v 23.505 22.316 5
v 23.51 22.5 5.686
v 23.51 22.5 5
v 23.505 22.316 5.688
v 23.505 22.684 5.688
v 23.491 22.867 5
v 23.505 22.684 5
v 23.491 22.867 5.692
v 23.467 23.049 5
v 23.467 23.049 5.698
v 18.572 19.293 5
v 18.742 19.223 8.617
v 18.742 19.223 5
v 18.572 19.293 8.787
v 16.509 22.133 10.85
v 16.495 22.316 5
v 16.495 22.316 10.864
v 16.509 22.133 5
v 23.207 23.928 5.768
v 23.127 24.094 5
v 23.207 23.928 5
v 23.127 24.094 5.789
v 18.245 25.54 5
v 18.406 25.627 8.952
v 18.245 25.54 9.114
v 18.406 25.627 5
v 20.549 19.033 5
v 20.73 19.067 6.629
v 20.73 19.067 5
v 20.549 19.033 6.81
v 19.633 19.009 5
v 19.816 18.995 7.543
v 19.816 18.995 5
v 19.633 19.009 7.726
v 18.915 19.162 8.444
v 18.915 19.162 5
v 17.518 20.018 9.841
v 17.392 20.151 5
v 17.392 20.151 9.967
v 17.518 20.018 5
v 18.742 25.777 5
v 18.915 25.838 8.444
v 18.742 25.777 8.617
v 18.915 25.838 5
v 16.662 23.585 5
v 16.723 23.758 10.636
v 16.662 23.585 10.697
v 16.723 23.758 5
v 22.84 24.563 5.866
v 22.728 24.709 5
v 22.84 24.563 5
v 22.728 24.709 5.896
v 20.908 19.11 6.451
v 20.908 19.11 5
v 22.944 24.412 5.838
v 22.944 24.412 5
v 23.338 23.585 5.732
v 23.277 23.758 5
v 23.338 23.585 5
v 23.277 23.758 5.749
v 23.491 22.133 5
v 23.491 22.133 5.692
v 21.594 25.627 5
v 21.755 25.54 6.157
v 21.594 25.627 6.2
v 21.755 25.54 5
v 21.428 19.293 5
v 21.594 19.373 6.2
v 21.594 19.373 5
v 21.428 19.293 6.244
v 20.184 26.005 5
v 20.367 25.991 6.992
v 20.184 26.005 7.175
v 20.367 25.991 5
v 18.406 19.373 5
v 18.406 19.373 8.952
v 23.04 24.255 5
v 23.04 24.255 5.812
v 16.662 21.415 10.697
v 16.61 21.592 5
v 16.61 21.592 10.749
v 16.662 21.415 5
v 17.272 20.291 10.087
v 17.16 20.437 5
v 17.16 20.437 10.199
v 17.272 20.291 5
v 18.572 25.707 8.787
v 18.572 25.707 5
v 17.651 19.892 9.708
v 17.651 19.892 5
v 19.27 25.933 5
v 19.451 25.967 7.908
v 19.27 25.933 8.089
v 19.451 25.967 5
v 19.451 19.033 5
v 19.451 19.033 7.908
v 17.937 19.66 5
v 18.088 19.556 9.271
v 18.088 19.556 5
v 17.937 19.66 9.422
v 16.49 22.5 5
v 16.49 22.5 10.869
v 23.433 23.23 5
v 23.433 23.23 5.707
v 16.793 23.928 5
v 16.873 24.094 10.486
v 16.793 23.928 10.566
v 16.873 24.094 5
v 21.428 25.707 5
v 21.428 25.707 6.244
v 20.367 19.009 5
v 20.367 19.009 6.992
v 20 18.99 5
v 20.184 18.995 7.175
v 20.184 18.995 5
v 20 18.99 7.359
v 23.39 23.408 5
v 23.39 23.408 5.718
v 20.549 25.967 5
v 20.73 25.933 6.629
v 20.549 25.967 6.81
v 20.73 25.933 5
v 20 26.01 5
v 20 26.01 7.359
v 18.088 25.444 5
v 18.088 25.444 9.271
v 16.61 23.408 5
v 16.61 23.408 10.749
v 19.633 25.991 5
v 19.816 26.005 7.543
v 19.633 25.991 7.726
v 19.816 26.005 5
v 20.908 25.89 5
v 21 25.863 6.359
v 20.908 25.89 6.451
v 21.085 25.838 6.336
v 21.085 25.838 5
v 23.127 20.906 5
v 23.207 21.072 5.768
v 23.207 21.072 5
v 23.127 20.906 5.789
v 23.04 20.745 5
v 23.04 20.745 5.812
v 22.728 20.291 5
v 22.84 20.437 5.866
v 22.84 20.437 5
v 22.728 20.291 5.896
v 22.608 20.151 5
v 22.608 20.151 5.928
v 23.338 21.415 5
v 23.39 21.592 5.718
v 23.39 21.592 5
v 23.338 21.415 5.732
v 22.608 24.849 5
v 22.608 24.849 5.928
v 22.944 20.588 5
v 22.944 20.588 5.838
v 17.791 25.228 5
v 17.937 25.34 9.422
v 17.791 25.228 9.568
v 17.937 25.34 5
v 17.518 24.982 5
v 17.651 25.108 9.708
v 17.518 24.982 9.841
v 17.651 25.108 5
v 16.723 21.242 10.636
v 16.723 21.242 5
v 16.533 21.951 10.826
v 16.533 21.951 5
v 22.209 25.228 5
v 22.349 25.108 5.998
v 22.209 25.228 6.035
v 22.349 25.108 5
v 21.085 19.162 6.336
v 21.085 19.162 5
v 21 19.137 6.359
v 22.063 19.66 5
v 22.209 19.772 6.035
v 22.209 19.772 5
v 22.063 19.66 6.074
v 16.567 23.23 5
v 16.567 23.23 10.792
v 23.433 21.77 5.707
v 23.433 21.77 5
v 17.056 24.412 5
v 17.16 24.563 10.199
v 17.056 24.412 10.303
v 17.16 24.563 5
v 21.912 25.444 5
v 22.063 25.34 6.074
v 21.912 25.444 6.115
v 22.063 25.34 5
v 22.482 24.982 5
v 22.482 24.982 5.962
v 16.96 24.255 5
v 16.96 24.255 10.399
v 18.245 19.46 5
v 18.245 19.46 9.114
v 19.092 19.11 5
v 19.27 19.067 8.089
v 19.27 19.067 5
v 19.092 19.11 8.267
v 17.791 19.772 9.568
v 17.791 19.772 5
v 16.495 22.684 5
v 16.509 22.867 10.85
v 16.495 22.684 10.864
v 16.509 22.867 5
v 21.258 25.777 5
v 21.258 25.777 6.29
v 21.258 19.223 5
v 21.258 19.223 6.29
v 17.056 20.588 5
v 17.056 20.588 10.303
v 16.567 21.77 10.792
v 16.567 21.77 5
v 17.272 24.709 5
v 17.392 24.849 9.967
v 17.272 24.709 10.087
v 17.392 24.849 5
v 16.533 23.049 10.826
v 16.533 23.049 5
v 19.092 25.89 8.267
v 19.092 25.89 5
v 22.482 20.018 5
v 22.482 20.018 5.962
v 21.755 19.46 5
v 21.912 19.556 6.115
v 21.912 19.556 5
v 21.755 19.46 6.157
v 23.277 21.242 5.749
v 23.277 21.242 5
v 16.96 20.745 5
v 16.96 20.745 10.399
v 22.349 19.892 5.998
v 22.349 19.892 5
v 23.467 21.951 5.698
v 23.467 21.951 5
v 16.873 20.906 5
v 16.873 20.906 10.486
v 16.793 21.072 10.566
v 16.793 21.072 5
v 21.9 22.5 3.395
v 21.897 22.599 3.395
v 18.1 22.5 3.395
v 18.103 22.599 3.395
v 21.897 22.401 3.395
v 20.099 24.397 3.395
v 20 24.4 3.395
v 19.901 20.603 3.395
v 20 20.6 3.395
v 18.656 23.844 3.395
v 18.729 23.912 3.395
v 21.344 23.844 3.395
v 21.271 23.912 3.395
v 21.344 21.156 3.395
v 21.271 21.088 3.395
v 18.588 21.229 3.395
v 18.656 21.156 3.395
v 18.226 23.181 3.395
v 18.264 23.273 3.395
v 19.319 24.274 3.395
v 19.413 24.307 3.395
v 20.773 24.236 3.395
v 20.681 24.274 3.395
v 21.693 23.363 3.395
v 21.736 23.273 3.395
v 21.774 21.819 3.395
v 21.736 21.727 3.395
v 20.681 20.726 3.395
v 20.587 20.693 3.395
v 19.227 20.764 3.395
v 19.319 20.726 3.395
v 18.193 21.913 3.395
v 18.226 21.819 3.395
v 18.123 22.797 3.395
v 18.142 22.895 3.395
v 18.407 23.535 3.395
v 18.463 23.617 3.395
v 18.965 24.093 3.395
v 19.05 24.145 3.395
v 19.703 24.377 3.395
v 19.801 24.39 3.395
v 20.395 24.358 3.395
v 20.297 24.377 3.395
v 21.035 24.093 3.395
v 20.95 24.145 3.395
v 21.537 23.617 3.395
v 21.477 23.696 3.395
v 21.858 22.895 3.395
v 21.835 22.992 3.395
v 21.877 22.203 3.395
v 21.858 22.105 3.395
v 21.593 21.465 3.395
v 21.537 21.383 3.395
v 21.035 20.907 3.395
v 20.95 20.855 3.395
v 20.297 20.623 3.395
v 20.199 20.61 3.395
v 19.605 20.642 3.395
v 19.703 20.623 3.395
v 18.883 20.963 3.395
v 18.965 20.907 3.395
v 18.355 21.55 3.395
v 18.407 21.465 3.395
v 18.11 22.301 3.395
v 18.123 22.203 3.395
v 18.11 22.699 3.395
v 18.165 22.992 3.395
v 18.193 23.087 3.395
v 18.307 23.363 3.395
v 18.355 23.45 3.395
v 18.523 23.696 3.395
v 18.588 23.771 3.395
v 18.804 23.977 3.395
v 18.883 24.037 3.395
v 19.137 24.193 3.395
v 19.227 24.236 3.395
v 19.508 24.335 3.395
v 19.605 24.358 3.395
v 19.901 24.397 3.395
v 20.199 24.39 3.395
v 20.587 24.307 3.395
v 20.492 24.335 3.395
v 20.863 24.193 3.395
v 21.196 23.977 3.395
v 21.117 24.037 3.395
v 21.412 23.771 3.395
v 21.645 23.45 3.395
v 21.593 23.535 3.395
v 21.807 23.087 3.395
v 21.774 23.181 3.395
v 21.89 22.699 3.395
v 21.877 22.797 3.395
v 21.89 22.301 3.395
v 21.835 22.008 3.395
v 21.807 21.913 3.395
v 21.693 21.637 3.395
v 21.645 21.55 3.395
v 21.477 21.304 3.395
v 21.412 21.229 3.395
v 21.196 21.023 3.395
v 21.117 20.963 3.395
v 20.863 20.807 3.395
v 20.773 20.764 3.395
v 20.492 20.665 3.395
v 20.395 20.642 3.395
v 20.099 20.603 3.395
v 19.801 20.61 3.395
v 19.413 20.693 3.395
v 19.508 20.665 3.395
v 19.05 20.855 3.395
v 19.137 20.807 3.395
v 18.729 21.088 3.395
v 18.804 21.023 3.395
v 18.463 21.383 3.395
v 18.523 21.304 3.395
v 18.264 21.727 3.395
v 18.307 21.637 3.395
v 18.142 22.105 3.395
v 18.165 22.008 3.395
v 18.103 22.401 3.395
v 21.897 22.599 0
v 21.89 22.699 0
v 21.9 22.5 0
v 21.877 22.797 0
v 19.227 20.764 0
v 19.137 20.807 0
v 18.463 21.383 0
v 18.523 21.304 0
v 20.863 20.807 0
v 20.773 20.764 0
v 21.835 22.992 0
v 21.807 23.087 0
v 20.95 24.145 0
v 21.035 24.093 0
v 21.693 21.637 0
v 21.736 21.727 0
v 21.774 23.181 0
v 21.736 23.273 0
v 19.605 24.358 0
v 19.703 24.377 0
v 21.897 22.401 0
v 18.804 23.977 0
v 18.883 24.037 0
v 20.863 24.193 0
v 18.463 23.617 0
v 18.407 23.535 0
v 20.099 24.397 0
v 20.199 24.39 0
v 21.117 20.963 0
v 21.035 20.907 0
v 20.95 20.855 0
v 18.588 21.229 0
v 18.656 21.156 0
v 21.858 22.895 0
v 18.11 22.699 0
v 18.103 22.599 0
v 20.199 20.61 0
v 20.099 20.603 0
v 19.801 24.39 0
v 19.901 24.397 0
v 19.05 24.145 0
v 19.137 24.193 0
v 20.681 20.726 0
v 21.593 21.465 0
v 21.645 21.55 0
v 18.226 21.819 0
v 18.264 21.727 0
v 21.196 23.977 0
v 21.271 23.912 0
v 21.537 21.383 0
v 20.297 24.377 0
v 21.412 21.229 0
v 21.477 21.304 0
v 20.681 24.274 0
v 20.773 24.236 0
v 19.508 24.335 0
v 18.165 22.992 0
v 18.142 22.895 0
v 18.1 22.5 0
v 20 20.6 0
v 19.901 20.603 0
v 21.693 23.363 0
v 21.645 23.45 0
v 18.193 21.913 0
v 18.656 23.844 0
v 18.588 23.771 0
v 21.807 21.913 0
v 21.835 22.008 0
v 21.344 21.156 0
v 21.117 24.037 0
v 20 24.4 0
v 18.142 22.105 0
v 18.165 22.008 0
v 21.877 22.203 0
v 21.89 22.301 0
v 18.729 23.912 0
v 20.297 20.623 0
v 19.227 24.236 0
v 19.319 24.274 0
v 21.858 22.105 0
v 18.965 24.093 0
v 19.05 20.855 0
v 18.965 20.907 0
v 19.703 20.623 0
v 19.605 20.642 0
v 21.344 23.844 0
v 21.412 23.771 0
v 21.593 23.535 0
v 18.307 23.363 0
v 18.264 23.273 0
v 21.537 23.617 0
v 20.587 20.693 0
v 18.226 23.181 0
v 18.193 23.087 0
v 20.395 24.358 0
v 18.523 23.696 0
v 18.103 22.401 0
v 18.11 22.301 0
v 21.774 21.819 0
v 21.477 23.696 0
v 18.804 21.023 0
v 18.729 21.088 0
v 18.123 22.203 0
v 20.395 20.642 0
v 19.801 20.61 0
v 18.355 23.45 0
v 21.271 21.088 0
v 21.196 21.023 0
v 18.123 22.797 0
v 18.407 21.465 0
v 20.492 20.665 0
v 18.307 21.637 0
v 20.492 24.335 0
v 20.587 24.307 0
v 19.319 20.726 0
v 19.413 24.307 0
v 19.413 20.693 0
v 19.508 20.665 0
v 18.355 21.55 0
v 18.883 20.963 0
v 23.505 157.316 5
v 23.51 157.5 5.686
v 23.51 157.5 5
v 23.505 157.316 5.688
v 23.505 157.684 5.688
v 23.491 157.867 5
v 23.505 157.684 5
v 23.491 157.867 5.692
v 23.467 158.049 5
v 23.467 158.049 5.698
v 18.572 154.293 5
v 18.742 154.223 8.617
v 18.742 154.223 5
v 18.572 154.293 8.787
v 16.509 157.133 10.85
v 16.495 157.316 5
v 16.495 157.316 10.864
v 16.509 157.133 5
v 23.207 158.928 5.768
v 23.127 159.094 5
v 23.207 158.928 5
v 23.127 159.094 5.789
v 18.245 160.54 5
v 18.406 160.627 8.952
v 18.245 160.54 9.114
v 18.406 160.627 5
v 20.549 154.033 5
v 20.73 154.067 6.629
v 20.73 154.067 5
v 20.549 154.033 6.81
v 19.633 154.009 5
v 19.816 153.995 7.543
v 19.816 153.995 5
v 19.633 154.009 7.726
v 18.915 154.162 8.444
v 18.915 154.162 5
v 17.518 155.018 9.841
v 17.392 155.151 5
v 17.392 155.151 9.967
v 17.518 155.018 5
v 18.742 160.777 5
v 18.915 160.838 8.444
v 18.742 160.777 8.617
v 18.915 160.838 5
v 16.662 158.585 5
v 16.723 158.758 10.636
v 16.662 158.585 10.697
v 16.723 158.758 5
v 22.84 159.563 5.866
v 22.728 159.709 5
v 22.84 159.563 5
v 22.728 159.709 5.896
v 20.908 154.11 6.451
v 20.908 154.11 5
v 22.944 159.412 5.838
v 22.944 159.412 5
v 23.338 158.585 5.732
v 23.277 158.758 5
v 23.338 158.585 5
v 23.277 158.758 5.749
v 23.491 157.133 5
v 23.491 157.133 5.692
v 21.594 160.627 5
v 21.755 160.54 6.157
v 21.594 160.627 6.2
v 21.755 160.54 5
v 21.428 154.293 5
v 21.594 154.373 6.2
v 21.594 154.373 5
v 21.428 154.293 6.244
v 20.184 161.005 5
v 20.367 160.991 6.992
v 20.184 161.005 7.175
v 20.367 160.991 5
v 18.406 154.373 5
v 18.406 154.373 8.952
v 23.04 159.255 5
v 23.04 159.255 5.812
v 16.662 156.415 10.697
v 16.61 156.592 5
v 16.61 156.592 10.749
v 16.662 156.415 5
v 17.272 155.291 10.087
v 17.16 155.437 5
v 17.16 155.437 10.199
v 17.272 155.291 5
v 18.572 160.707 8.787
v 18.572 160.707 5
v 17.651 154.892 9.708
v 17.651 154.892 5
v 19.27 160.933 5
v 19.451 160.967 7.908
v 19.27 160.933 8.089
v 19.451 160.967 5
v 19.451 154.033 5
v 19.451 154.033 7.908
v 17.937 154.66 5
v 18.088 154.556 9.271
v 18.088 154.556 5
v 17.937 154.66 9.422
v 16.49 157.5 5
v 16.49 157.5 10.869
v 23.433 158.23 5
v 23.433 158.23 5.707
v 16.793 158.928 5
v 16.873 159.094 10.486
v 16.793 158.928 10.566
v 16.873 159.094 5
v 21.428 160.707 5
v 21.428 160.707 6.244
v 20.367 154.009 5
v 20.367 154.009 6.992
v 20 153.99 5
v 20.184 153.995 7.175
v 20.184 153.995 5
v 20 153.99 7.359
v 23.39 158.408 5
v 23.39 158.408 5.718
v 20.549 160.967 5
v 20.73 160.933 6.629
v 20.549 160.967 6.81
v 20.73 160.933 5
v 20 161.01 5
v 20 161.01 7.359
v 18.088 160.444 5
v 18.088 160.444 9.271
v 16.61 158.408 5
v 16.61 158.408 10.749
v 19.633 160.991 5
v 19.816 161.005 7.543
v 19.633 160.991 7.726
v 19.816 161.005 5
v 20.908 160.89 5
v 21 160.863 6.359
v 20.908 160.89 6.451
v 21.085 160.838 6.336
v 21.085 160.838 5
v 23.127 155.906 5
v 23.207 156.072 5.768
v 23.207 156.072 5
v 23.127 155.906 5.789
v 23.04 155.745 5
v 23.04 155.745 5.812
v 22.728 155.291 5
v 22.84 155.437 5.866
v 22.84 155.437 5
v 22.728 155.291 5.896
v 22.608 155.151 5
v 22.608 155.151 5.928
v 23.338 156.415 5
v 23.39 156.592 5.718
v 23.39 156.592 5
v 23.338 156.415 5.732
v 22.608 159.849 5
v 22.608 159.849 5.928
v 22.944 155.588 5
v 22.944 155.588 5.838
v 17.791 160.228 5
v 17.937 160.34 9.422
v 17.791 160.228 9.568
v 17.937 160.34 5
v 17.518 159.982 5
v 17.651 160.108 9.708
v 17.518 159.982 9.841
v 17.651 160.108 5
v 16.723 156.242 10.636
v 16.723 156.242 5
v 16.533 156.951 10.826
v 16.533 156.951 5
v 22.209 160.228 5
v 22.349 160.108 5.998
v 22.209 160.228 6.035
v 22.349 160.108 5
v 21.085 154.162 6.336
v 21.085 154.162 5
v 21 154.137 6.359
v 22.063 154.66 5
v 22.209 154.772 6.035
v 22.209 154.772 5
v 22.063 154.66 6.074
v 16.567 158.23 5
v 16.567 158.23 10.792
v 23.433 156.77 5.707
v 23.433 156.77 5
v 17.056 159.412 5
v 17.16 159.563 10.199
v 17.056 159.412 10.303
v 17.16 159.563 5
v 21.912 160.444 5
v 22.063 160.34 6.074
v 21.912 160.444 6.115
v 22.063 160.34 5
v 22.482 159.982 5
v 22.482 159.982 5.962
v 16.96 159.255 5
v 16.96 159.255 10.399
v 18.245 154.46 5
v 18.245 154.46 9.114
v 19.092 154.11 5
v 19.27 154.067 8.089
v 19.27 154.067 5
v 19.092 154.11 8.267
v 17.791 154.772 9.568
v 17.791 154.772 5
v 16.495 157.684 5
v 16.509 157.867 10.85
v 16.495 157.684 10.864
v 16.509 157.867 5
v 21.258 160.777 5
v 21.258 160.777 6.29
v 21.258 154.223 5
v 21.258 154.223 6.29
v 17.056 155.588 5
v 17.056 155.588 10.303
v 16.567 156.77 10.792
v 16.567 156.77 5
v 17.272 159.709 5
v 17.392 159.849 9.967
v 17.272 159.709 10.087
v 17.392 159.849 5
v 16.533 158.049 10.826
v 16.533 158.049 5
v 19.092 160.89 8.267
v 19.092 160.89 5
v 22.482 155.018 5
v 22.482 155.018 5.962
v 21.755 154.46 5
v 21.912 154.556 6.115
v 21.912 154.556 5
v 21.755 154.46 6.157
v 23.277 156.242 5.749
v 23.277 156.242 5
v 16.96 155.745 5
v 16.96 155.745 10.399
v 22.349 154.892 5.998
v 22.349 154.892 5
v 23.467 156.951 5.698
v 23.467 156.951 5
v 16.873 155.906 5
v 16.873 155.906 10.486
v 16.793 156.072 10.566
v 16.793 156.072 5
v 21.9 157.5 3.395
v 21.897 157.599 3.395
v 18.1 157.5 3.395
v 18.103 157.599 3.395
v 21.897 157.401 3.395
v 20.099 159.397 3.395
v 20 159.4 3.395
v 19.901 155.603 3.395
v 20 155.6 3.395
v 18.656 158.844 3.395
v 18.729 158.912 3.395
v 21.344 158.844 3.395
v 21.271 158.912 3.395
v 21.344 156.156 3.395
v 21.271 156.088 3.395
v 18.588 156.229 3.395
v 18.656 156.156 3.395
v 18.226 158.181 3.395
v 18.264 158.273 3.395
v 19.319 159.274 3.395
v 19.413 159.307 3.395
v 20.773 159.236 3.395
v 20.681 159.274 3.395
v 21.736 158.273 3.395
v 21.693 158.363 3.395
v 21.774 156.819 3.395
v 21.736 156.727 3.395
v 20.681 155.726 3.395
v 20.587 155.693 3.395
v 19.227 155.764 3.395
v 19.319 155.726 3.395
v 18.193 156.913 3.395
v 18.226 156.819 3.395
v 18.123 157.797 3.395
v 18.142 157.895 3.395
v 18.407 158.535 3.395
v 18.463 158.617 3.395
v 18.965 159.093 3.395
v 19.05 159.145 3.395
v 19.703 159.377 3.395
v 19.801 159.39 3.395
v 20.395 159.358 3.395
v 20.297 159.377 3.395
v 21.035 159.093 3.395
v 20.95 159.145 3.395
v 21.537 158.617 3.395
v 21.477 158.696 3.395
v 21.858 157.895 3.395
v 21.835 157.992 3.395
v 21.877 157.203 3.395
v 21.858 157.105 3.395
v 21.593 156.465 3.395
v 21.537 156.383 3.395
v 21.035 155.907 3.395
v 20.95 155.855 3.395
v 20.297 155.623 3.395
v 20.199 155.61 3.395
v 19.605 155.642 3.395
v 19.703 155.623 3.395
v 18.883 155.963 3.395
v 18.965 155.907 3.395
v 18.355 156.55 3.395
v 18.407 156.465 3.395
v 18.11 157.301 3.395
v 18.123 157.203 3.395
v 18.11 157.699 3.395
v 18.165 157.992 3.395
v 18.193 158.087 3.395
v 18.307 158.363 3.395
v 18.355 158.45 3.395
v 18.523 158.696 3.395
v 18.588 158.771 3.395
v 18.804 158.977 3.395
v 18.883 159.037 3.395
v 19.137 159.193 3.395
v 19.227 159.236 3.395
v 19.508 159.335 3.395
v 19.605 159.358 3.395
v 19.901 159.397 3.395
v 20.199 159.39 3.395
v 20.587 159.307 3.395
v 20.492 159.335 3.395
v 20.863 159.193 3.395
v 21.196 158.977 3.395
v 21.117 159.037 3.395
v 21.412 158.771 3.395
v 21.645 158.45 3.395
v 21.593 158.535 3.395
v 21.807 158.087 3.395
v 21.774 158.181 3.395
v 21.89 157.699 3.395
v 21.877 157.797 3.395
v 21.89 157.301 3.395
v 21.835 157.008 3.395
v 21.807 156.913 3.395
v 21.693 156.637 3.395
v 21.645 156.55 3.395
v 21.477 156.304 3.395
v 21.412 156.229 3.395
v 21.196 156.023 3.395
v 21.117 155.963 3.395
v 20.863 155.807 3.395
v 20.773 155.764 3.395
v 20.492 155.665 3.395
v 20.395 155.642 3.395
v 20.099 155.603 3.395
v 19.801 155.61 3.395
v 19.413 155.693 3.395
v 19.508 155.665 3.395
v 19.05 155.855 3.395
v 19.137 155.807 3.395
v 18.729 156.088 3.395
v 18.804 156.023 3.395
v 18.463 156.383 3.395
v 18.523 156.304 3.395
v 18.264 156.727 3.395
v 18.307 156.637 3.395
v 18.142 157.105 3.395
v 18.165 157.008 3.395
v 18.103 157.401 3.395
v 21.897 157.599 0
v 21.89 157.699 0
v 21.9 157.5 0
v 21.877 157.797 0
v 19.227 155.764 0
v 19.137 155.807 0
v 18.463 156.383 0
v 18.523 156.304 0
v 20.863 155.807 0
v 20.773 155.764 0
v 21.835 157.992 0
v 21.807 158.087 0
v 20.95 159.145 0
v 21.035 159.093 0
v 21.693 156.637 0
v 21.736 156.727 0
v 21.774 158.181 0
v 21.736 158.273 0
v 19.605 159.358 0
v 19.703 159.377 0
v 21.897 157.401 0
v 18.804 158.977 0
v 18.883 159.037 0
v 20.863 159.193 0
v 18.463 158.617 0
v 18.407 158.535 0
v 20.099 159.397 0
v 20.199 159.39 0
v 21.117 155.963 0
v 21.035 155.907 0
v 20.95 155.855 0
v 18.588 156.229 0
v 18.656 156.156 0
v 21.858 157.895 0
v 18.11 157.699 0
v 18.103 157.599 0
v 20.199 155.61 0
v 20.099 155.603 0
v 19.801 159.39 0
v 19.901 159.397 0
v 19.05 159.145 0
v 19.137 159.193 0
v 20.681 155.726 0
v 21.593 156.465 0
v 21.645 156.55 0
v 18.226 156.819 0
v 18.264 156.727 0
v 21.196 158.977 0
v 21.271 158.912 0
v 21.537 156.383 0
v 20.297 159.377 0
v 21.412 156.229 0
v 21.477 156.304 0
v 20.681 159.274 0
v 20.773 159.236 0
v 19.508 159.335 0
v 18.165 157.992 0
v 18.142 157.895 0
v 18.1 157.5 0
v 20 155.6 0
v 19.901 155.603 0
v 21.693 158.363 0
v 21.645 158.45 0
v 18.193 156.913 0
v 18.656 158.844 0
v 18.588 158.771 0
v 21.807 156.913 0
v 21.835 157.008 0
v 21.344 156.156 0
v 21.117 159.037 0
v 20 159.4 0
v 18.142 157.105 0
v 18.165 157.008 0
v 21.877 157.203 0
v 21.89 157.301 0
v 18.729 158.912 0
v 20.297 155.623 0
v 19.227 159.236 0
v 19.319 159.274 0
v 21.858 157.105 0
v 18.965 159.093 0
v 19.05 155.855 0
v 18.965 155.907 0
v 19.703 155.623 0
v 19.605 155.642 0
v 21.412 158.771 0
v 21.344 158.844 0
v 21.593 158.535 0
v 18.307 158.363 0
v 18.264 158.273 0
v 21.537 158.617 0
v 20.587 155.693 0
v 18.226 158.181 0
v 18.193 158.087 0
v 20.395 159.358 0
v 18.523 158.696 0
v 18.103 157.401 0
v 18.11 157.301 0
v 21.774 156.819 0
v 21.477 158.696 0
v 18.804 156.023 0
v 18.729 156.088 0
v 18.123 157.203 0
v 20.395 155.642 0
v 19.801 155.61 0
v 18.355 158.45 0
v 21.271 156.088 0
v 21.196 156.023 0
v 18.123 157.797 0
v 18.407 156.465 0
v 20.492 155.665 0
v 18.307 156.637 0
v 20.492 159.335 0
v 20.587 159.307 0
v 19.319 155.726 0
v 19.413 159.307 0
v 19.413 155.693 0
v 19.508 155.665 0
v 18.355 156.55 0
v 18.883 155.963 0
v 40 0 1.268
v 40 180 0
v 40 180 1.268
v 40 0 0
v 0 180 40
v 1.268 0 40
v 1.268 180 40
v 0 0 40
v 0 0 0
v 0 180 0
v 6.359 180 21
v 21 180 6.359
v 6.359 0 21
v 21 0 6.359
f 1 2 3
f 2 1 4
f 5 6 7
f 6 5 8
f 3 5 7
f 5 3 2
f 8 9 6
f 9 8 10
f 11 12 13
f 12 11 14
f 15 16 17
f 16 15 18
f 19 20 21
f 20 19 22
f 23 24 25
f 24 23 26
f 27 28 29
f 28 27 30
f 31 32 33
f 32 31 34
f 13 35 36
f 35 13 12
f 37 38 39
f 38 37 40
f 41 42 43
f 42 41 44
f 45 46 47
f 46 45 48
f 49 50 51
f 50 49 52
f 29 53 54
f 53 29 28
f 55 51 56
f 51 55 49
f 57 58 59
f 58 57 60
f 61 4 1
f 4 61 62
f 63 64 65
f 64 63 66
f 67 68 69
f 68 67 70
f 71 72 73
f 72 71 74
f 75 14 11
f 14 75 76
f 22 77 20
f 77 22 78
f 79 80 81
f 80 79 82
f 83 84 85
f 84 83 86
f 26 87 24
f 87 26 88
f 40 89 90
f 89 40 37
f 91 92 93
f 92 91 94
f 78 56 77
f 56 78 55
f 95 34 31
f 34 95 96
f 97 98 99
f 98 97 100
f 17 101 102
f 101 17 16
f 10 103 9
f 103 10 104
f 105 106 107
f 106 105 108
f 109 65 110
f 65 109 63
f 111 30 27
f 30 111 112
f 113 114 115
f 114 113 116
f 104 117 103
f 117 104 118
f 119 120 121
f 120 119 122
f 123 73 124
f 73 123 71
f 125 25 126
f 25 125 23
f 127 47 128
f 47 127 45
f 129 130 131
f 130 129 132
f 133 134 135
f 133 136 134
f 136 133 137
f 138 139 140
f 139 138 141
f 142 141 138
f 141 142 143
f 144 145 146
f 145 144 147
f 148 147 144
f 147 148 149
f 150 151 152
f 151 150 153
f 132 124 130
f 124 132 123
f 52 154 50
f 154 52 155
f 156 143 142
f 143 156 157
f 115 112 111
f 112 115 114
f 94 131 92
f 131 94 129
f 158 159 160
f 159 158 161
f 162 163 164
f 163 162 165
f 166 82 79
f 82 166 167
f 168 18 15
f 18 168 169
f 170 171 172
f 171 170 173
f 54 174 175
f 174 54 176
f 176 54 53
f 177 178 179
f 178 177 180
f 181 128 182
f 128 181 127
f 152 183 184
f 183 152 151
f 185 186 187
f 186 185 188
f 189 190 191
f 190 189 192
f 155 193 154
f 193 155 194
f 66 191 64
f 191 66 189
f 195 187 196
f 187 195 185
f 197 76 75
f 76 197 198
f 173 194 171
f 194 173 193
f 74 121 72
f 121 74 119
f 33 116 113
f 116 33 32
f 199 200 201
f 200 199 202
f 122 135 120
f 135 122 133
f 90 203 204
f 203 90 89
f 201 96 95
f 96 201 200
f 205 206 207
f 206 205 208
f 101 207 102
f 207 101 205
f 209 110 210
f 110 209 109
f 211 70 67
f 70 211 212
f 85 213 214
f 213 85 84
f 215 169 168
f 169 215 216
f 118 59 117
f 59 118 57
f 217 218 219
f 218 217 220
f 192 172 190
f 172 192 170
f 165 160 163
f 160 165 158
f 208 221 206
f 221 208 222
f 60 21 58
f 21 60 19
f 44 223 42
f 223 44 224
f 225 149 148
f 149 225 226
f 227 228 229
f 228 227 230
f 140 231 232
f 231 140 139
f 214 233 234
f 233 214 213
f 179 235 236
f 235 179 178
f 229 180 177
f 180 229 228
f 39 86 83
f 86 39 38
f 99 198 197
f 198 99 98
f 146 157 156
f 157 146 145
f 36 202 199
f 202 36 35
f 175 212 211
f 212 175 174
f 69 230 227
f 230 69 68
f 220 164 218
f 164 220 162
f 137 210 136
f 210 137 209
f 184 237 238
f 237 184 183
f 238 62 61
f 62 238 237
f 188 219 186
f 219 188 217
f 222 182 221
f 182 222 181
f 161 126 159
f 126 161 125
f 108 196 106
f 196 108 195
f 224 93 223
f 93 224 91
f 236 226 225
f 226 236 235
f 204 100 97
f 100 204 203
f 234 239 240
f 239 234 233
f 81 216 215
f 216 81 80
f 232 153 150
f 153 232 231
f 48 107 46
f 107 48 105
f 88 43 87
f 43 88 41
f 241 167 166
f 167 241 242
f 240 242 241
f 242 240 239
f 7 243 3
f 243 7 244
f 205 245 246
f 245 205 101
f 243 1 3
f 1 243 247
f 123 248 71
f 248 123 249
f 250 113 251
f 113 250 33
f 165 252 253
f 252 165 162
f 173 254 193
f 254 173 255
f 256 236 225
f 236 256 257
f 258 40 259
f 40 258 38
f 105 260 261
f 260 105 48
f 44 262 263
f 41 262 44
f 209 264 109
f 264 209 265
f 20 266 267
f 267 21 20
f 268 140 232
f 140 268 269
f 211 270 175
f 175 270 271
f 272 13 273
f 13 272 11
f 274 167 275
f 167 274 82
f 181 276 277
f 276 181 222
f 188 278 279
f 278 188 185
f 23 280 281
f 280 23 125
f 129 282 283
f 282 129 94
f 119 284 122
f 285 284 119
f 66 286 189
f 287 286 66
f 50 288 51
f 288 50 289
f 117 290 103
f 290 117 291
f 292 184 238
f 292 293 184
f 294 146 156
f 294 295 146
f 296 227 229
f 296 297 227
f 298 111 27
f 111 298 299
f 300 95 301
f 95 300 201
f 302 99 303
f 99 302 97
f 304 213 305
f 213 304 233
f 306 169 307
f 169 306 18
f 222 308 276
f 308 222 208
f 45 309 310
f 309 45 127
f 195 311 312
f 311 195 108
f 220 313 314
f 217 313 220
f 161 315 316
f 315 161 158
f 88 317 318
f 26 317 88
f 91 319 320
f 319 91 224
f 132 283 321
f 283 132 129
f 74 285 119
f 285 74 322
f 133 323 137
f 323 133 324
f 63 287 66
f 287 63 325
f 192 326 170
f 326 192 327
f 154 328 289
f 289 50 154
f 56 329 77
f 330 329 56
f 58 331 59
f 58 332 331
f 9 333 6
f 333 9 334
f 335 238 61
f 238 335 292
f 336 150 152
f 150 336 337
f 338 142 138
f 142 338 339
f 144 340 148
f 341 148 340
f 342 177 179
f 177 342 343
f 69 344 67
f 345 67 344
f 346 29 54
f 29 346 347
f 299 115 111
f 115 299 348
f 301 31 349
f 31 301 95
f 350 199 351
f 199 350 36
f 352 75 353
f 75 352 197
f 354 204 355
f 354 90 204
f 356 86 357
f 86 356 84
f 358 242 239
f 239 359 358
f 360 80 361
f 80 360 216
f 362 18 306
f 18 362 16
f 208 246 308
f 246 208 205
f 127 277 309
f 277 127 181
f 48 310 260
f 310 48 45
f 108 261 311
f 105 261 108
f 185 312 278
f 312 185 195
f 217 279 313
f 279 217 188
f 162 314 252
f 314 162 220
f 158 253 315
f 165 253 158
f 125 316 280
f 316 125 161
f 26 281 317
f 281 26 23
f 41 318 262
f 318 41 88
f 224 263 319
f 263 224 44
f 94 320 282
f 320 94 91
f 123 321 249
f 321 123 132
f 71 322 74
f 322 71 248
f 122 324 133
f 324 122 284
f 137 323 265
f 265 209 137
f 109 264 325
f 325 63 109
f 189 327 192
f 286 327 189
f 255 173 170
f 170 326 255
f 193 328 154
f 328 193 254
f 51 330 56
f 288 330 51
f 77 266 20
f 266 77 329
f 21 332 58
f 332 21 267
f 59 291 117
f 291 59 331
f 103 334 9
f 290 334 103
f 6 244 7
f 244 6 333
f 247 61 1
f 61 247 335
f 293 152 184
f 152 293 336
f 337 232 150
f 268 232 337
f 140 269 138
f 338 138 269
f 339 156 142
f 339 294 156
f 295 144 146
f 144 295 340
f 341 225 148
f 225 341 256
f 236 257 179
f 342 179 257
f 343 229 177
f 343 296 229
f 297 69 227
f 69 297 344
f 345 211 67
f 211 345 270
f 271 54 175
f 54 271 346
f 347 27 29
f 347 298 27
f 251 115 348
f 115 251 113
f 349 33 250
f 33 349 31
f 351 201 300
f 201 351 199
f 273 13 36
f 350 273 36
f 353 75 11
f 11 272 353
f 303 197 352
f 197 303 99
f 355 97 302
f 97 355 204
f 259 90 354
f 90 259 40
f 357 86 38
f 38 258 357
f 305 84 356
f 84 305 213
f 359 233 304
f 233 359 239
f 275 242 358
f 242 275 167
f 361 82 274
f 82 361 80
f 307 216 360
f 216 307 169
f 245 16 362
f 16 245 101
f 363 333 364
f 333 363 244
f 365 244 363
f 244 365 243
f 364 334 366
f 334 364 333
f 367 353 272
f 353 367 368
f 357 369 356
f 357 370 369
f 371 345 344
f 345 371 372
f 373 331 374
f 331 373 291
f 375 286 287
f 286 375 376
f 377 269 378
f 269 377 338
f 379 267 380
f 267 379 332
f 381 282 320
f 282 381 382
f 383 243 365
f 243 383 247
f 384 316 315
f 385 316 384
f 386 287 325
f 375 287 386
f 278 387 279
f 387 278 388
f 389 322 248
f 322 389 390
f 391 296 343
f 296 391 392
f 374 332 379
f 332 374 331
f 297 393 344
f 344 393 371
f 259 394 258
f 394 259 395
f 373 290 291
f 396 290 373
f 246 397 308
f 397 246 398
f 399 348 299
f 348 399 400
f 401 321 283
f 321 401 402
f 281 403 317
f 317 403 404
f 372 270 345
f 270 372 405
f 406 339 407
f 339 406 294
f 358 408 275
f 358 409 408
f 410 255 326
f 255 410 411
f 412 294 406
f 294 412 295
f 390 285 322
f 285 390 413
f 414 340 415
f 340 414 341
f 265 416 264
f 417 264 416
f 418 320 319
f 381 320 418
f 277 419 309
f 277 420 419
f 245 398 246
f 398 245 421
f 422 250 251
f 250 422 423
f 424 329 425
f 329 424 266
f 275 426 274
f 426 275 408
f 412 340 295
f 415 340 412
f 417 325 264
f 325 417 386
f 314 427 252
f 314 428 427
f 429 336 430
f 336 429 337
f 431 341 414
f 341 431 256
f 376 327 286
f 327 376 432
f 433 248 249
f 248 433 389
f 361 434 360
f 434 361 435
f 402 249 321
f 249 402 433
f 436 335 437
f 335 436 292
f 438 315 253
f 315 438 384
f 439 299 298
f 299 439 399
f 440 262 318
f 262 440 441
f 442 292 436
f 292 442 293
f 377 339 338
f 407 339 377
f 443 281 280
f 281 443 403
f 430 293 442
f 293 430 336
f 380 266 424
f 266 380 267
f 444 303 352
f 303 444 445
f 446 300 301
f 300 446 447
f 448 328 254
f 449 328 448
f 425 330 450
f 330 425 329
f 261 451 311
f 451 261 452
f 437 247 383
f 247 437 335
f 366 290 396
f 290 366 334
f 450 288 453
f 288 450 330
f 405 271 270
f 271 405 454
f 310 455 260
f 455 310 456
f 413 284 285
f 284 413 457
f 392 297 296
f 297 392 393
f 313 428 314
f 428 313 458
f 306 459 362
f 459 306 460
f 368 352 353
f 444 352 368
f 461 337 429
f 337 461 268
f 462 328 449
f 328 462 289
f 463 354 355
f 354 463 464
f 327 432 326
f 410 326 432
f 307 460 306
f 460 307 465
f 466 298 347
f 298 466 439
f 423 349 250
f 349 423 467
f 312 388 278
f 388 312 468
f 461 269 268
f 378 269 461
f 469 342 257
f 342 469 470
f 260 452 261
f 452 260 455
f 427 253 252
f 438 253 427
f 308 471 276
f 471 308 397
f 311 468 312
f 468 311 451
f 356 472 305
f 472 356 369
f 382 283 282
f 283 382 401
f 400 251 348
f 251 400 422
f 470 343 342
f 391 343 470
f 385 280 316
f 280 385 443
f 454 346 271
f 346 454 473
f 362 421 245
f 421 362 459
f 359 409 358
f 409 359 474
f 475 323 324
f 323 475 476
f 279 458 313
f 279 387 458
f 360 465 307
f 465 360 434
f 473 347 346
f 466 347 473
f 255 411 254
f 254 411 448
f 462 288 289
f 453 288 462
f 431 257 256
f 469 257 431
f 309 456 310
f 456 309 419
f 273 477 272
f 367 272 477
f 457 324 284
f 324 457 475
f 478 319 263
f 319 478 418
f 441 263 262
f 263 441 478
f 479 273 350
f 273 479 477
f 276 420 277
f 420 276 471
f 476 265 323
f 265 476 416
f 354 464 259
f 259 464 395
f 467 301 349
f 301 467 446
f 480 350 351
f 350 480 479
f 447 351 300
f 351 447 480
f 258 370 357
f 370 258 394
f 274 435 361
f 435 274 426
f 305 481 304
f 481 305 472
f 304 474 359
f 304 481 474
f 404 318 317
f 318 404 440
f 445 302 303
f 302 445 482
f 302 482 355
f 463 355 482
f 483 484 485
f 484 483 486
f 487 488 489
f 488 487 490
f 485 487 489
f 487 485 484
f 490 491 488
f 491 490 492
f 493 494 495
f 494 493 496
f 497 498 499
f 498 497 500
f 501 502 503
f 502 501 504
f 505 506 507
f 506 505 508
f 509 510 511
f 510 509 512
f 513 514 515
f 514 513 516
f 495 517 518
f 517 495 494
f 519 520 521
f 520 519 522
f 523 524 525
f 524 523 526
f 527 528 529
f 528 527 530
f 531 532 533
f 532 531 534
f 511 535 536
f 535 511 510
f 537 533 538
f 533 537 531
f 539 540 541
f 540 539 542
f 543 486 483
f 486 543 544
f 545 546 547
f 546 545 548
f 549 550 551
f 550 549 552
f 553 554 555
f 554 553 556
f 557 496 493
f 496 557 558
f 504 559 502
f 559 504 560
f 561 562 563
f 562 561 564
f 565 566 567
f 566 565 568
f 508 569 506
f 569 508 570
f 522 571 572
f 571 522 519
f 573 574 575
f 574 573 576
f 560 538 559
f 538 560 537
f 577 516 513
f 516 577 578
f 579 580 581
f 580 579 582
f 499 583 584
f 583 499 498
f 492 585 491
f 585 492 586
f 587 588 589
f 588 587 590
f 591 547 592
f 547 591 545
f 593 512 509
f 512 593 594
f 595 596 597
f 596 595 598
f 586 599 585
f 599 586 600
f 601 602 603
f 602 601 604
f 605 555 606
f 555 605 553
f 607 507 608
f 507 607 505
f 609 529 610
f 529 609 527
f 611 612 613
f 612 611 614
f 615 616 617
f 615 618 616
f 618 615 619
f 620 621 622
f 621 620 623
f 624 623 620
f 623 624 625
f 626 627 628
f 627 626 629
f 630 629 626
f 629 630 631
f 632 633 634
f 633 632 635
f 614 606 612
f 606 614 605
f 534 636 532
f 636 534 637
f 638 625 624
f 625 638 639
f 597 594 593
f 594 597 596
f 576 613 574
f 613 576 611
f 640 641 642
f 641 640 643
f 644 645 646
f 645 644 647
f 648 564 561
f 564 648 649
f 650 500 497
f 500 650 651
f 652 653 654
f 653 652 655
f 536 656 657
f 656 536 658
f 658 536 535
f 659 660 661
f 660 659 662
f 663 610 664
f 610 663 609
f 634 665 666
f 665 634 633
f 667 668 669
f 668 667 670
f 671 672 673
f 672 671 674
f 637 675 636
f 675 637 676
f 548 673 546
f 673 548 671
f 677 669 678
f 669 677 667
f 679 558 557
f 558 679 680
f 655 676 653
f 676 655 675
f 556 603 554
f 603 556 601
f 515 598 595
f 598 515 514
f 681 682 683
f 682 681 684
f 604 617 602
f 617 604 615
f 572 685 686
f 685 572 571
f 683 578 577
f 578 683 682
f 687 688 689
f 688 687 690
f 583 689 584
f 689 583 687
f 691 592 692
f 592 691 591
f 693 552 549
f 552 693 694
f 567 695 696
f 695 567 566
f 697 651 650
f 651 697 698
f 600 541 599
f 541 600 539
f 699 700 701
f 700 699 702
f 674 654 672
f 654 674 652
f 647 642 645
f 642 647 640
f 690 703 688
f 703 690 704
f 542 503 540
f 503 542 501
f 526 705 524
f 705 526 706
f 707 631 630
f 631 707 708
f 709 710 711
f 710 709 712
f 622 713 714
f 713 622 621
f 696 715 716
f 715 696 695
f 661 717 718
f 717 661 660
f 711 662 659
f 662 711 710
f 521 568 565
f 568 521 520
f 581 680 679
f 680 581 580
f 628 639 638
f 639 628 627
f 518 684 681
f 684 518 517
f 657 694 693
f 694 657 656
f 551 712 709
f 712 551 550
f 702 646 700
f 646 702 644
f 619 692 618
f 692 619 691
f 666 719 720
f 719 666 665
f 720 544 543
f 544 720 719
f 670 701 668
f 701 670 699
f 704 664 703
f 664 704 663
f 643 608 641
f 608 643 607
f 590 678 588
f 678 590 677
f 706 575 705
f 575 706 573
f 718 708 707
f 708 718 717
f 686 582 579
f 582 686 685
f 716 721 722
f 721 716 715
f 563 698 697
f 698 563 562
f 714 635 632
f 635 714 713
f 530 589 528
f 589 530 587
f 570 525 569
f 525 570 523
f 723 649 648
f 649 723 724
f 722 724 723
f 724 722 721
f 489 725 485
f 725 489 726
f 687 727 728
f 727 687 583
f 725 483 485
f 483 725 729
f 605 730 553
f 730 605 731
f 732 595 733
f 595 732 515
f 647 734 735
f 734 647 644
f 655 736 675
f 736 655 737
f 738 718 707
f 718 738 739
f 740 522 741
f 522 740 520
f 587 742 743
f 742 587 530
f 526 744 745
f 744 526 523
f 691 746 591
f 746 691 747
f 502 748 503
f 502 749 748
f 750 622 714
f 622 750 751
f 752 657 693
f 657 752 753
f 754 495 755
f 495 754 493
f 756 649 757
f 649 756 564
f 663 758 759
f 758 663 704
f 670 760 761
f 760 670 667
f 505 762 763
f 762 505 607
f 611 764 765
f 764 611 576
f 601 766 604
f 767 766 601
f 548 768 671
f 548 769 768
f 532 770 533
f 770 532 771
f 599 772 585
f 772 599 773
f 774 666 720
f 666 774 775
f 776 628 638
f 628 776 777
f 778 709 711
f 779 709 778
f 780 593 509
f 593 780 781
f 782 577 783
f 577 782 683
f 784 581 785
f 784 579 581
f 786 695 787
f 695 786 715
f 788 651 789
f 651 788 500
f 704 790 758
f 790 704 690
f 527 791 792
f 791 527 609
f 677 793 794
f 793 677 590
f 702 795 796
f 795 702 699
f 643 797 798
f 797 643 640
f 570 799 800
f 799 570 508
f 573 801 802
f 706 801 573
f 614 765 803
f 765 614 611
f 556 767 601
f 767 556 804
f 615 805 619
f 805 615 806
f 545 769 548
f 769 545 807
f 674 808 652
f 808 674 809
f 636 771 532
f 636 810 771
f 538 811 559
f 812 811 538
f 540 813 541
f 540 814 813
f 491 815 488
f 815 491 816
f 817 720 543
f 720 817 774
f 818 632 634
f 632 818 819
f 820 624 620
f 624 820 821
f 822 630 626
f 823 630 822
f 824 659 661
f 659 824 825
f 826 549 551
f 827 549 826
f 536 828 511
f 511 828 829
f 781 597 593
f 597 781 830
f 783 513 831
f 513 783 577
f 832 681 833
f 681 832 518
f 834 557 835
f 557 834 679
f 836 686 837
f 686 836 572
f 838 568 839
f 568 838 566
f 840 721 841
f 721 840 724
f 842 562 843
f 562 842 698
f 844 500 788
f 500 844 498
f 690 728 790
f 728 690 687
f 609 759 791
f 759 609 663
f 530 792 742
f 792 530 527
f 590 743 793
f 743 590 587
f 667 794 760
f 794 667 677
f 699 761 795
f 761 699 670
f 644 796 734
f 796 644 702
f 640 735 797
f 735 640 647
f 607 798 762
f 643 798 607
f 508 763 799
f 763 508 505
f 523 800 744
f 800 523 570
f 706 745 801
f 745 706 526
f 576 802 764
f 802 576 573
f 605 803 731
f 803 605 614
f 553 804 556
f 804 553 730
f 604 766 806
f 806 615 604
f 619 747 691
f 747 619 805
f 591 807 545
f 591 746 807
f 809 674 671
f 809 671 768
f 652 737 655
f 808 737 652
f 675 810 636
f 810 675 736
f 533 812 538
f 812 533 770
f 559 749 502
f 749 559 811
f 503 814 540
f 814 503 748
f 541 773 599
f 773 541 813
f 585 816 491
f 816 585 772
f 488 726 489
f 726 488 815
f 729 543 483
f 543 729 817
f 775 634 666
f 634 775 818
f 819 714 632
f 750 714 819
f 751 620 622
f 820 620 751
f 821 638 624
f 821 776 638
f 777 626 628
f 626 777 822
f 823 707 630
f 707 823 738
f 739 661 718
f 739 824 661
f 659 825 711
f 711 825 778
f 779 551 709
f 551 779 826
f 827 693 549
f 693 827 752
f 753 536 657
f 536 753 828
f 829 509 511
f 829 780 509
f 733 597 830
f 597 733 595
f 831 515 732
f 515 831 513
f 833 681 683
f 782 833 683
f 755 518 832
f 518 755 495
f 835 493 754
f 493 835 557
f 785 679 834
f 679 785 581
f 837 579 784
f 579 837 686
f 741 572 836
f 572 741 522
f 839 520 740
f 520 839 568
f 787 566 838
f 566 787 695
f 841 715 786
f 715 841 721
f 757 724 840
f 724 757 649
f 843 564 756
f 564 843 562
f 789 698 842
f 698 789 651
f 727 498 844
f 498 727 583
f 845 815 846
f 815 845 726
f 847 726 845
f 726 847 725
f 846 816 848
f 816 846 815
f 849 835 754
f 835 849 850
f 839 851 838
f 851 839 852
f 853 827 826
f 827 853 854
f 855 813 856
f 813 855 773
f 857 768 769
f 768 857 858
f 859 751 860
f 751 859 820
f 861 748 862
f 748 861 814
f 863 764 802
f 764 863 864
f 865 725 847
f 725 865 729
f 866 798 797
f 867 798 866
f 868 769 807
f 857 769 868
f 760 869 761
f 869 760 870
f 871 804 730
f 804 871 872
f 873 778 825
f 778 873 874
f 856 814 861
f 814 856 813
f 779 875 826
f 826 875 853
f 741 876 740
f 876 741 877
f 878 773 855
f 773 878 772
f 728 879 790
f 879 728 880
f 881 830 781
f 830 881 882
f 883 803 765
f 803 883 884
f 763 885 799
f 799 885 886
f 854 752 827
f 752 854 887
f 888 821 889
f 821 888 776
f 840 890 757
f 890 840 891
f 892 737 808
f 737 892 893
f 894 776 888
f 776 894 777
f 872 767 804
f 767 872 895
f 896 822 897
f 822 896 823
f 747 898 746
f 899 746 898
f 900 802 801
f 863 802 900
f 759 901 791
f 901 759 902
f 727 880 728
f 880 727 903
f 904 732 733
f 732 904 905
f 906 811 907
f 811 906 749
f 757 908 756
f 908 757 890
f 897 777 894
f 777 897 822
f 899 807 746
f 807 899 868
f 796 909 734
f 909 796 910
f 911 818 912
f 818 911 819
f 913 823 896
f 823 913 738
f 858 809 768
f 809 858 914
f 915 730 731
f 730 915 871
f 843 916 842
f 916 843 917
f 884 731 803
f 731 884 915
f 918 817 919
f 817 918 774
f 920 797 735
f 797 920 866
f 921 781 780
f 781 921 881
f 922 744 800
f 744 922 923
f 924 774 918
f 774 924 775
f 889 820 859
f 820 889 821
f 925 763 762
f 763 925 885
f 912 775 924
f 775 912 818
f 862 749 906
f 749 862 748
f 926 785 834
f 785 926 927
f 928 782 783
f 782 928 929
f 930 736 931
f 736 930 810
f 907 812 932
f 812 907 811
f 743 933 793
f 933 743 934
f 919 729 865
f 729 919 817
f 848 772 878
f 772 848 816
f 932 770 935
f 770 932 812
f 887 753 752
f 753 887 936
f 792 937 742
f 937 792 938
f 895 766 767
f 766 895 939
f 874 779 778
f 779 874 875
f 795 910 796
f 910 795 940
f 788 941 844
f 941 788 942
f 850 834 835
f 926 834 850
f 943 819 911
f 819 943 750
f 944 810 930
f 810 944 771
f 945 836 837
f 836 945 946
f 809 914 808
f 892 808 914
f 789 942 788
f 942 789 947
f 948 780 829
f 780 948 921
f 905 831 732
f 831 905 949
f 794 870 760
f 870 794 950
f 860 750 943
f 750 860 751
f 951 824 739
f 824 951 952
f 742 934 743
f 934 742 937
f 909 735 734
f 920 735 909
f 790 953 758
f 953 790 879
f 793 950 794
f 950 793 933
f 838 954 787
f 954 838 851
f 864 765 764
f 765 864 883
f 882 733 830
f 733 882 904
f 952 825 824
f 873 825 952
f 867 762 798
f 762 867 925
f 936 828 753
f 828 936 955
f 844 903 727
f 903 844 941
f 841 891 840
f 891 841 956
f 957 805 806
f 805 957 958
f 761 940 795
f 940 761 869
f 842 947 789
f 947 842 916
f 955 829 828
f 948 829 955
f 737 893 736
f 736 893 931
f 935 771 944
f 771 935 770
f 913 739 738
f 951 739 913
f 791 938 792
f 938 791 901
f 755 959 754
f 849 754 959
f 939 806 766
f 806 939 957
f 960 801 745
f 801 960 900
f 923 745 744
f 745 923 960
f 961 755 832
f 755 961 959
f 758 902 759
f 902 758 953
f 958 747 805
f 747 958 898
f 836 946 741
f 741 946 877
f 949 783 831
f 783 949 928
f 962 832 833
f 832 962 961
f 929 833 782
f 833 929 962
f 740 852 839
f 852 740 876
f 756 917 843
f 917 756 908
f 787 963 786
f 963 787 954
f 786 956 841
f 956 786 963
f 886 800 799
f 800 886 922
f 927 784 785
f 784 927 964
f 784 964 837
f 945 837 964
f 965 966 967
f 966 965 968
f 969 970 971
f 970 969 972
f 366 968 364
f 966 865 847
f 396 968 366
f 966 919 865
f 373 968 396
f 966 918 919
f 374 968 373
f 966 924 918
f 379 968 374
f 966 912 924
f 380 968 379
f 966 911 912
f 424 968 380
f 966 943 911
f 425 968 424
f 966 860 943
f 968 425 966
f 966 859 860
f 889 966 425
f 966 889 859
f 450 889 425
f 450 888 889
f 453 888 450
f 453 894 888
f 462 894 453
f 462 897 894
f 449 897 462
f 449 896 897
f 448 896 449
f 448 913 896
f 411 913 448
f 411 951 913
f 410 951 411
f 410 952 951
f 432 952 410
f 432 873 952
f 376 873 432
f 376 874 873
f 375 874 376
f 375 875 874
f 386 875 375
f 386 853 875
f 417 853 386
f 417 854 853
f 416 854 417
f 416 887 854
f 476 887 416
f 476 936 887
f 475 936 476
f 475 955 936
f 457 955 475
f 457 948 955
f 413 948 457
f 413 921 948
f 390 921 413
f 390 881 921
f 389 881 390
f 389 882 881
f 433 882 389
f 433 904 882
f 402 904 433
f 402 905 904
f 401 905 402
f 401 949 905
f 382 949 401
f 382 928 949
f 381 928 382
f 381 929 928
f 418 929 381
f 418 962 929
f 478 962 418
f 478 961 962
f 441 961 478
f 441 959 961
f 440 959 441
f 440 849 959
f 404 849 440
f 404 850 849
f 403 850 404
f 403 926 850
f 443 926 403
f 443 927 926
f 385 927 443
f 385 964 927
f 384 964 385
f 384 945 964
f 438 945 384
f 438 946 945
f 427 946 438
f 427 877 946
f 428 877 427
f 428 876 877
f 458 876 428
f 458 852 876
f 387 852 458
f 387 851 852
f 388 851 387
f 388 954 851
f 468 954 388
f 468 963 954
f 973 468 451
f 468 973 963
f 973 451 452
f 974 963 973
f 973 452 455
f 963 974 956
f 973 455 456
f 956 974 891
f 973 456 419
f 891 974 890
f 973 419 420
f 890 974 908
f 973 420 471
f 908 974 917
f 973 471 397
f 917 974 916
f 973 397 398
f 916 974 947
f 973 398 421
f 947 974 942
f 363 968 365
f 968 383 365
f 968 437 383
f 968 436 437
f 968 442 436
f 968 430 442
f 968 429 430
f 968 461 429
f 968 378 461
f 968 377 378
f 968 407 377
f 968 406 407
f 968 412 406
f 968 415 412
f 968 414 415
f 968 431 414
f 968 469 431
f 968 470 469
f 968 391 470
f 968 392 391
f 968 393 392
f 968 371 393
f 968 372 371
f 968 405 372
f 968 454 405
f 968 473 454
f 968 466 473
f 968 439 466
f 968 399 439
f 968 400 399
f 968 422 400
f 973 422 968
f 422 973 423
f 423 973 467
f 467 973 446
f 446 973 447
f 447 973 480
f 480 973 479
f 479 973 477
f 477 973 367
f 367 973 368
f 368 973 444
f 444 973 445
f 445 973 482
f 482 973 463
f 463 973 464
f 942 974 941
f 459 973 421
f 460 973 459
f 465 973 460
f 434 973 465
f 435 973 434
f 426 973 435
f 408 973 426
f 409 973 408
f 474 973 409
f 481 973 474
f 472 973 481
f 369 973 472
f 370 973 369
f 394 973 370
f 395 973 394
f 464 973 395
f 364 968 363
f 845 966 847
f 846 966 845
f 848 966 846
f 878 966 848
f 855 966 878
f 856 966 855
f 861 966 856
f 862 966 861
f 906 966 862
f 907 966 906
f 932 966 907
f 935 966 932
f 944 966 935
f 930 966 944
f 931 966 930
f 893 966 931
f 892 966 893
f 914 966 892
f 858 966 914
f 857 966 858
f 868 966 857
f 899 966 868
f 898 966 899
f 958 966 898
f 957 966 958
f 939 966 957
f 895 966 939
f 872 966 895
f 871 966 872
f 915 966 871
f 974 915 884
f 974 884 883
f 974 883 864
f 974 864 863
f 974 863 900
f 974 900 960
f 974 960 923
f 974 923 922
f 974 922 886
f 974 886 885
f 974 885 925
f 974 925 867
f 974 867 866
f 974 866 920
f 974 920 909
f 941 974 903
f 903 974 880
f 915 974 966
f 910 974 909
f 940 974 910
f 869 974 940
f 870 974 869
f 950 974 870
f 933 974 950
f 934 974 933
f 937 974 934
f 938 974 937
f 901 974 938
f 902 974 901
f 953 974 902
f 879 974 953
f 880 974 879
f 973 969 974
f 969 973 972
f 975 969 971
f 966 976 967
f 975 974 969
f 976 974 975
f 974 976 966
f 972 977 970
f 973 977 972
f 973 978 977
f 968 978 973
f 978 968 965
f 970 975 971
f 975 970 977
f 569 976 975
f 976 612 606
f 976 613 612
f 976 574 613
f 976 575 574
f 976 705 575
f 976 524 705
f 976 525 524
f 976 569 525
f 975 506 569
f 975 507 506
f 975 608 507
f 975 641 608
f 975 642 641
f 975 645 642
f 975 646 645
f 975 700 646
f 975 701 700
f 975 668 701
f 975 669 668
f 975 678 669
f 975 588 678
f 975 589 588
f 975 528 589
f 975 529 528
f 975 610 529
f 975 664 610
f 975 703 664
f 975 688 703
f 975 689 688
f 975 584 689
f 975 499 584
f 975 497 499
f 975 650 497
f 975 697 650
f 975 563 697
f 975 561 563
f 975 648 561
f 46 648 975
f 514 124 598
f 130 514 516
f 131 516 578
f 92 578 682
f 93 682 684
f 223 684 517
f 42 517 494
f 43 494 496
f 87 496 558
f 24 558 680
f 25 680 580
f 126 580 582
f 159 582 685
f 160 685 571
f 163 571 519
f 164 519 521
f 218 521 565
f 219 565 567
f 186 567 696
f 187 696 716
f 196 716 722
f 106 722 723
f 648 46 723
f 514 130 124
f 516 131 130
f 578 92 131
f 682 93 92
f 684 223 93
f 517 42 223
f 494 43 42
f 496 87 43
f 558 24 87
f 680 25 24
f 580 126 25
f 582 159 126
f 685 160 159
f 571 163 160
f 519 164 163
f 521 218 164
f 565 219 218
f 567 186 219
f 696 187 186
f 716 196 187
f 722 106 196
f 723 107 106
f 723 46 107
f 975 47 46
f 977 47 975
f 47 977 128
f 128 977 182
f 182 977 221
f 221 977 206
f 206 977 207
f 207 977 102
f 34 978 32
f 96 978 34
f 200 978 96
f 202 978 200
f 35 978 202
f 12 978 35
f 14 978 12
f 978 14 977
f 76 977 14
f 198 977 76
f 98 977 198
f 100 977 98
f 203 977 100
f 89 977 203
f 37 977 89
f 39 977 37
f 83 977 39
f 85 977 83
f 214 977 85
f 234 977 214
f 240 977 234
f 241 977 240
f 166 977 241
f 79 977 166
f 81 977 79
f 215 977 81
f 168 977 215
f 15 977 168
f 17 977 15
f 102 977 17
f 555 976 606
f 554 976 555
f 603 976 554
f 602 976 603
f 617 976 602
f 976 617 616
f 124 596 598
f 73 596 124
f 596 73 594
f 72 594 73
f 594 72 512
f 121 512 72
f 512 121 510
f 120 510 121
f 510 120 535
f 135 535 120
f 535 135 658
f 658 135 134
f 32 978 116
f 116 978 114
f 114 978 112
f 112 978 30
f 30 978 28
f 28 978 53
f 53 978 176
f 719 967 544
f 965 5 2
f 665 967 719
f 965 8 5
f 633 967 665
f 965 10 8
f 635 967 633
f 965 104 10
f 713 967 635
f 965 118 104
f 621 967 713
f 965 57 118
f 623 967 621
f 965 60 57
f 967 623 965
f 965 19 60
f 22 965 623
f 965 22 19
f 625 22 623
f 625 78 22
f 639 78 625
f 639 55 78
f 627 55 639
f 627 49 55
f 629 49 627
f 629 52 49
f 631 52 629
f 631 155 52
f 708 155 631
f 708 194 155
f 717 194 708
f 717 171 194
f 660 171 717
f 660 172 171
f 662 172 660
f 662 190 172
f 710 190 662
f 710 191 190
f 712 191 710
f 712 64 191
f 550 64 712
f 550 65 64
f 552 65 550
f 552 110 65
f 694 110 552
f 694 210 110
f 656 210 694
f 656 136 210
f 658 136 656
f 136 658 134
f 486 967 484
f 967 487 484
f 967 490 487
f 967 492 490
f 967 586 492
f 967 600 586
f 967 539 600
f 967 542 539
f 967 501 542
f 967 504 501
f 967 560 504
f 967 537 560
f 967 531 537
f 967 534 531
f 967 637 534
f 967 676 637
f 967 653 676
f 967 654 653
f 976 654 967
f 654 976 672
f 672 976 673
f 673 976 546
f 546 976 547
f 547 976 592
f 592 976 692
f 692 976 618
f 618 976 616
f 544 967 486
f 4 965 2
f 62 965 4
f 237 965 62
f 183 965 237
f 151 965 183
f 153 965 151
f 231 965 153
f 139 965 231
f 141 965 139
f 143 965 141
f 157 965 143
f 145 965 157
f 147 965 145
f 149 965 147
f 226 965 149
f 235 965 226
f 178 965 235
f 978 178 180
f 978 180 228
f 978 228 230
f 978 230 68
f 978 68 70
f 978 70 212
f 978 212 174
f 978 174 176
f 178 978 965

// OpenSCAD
// Shelf side bracket with 2 screws
// Adapt to size
// by Martin Korinek
// Oct. 2020

$fn = 12; 
bracket_size = 40;
bracket_width = 180;
bracket_thickness = 1; //measured from a circle e.g. 

difference()
{
    cube([bracket_size,bracket_width,bracket_size]);
    translate([bracket_size+bracket_thickness,0,bracket_size+bracket_thickness]) 
        rotate([-90,0,0]) 
            cylinder(h=bracket_width,r=bracket_size);
    //screw hole #1
    translate([bracket_size/2,bracket_width/8,2]) screw_hole();
    //screw hole #2
    translate([bracket_size/2,bracket_width-bracket_width/8,2]) screw_hole();
}



module screw_hole()
{   
    $fn =120; 
    screw_diameter = 3.8;
    head_diameter = 7;
    
    translate([0,0,head_diameter/2-0.5])
        cylinder(h=100, d1=head_diameter+0.02, d2=head_diameter+0.02);
    translate([0,0,-0.5])cylinder(h=head_diameter/2, d1=0, d2=head_diameter+0.02);
    translate([0,0,-18])cylinder(h=20, d=screw_diameter);
}
